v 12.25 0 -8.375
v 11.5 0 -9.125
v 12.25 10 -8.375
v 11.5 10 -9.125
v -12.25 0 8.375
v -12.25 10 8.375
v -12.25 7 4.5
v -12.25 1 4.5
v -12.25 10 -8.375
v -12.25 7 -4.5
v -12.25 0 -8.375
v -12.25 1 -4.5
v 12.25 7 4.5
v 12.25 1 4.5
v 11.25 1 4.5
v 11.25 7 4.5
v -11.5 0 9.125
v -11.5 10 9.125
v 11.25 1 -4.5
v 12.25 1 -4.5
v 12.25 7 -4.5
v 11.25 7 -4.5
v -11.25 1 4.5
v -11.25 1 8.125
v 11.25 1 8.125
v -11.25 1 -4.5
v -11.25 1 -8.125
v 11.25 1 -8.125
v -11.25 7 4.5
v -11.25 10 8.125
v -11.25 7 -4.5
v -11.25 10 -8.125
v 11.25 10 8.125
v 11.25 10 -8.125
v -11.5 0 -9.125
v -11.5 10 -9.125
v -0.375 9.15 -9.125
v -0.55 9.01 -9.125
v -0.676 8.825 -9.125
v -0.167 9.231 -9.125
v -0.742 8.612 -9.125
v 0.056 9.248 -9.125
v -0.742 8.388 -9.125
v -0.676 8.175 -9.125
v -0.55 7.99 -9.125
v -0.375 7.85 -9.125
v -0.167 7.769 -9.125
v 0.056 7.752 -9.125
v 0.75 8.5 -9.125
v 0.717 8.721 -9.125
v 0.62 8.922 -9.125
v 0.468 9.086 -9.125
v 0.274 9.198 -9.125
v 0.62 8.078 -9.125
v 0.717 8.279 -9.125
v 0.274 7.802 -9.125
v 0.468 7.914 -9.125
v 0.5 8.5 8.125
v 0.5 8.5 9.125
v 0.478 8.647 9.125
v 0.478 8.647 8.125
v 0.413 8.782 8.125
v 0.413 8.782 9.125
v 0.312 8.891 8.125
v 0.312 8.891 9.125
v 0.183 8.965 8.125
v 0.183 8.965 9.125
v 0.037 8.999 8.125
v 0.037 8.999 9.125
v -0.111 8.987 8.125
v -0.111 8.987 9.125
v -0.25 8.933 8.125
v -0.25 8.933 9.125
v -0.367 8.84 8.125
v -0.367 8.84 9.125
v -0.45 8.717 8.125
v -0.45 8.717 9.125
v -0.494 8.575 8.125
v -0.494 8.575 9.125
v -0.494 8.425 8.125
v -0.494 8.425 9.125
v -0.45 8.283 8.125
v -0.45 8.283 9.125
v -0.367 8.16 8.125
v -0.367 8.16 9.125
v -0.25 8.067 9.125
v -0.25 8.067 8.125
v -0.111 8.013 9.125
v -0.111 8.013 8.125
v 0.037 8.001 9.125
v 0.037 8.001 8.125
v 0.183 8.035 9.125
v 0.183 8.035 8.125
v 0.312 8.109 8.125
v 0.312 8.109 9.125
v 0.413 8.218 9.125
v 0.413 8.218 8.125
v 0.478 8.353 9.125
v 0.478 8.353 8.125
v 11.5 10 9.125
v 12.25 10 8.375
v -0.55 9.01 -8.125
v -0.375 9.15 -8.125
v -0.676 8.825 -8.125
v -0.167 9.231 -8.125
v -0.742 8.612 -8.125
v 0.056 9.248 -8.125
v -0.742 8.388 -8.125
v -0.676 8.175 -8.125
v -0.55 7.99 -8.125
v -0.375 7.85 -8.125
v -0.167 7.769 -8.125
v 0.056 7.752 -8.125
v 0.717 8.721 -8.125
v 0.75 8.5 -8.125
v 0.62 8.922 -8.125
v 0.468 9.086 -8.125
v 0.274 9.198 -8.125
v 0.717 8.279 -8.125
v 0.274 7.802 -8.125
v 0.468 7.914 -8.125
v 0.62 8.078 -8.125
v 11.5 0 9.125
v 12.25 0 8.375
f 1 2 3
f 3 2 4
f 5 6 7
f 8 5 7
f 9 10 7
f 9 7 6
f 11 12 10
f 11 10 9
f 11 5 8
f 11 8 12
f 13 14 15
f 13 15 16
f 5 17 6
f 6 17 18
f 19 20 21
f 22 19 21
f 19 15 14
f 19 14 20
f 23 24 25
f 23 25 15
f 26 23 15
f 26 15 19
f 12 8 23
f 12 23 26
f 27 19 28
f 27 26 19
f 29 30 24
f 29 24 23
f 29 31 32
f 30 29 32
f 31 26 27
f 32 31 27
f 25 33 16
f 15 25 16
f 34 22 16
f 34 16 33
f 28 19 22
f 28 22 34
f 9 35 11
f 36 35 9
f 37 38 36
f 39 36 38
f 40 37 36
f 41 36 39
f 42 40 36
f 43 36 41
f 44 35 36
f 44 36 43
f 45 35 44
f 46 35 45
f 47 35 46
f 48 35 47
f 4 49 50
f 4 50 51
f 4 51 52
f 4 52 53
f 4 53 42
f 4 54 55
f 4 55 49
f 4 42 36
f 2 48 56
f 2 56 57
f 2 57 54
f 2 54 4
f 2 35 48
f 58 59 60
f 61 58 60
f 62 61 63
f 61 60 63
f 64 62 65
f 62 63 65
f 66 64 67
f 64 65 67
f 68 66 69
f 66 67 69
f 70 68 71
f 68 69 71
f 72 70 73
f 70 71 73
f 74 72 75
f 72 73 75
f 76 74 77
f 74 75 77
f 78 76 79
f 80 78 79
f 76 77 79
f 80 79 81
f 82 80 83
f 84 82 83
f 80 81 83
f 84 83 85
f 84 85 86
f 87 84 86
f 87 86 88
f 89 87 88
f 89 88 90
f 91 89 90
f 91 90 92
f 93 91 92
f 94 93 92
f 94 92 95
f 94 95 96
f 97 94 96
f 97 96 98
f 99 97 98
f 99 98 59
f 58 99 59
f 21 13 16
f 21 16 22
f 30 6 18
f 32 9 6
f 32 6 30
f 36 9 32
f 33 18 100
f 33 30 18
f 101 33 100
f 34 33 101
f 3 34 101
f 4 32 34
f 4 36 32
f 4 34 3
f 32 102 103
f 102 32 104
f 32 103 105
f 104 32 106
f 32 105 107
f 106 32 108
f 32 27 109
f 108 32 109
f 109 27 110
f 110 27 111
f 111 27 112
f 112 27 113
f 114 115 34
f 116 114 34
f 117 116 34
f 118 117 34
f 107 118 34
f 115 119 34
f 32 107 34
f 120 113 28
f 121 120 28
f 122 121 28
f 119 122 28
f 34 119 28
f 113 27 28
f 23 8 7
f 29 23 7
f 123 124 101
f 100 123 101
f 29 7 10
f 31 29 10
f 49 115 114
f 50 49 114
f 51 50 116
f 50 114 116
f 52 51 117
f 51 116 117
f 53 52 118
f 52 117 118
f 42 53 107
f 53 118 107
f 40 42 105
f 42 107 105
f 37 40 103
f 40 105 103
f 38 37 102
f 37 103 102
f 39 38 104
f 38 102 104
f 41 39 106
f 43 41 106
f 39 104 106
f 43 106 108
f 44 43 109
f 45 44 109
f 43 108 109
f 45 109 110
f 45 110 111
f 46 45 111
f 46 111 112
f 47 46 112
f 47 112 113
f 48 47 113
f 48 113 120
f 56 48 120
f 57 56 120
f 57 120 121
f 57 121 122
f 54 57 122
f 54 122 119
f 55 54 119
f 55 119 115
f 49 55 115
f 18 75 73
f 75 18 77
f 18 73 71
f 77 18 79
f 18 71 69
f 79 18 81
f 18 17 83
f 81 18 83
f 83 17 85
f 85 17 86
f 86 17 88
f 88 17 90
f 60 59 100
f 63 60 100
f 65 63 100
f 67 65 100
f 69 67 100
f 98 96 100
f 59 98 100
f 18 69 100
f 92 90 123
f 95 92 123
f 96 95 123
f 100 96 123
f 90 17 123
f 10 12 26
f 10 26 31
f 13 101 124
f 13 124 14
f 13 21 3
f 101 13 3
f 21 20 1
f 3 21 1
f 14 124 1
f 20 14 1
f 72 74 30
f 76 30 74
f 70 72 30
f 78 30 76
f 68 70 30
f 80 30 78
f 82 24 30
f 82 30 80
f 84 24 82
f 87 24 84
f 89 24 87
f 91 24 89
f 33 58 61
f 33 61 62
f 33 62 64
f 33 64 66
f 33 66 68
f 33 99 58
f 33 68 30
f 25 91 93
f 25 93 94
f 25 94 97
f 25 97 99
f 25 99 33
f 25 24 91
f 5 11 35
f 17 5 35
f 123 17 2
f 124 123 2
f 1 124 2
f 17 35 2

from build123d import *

# Parameters (mm, degrees)
SKETCH1_W           = 24.5
SKETCH1_H           = 18.25
BOSS_EXTRUDE1_DEPTH = 10
SHELL4_T            = -1
CHAMFER1_SIZE       = 0.75
CUT_EXTRUDE2_REACH  = 25.401
SKETCH8_R           = 0.75
CUT_EXTRUDE3_REACH  = 26.148
SKETCH9_R           = 0.5
CUT_EXTRUDE4_REACH  = 29.991
SKETCH10_W          = 9
SKETCH10_H          = 6


with BuildPart() as part:
    # Sketch1 → Boss-Extrude1 (new body)
    with BuildSketch(Plane(origin=(0, 0, 0), x_dir=(1, 0, 0), z_dir=(0, 1, 0))):
        Rectangle(SKETCH1_W, SKETCH1_H)
    extrude(amount=BOSS_EXTRUDE1_DEPTH)

    # Shell4
    shell4_openings = [part.faces().sort_by_distance(p)[0] for p in [
        (0, 10, 0),
    ]]
    offset(amount=SHELL4_T, openings=shell4_openings, kind=Kind.INTERSECTION)

    # Chamfer1
    chamfer1_edges = [part.edges().sort_by_distance(p)[0] for p in [
        (12.25, 5, 9.125),
        (-12.25, 5, 9.125),
        (-12.25, 5, -9.125),
        (12.25, 5, -9.125),
    ]]
    chamfer(chamfer1_edges, length=CHAMFER1_SIZE)

    # Sketch8 → Cut-Extrude2 (cut, up to next)
    with BuildSketch(Plane.XY.offset(-8.125), mode=Mode.PRIVATE) as cut_extrude2_sk1:
        with Locations((0, 8.5)):
            Circle(SKETCH8_R)
    cut_extrude2_tool1 = extrude(cut_extrude2_sk1.sketch, amount=-CUT_EXTRUDE2_REACH, mode=Mode.PRIVATE) & part.part
    add(cut_extrude2_tool1.solids().sort_by_distance((0, 8.5, -8.125))[0], mode=Mode.SUBTRACT)

    # Sketch9 → Cut-Extrude3 (cut, up to next)
    with BuildSketch(Plane.XY.offset(9.125), mode=Mode.PRIVATE) as cut_extrude3_sk1:
        with Locations((0, 8.5)):
            Circle(SKETCH9_R)
    cut_extrude3_tool1 = extrude(cut_extrude3_sk1.sketch, amount=-CUT_EXTRUDE3_REACH, mode=Mode.PRIVATE) & part.part
    add(cut_extrude3_tool1.solids().sort_by_distance((0, 8.5, 9.125))[0], mode=Mode.SUBTRACT)

    # Sketch10 → Cut-Extrude4 (cut, up to next)
    with BuildSketch(Plane(origin=(12.25, 0, 0), x_dir=(0, 0, -1), z_dir=(1, 0, 0)), mode=Mode.PRIVATE) as cut_extrude4_sk1:
        with Locations((0, 4)):
            Rectangle(SKETCH10_W, SKETCH10_H)
    cut_extrude4_tool1 = extrude(cut_extrude4_sk1.sketch, amount=-CUT_EXTRUDE4_REACH, mode=Mode.PRIVATE) & part.part
    cut_extrude4 = cut_extrude4_tool1.solids().sort_by_distance((12.25, 4, 0))[0]
    add(cut_extrude4, mode=Mode.SUBTRACT)

    # Mirror1: Cut-Extrude4 across plane
    add(cut_extrude4.mirror(Plane(origin=(0, 0, 0), x_dir=(0, 0, 1), z_dir=(1, 0, 0))), mode=Mode.SUBTRACT)


solid = part.part
